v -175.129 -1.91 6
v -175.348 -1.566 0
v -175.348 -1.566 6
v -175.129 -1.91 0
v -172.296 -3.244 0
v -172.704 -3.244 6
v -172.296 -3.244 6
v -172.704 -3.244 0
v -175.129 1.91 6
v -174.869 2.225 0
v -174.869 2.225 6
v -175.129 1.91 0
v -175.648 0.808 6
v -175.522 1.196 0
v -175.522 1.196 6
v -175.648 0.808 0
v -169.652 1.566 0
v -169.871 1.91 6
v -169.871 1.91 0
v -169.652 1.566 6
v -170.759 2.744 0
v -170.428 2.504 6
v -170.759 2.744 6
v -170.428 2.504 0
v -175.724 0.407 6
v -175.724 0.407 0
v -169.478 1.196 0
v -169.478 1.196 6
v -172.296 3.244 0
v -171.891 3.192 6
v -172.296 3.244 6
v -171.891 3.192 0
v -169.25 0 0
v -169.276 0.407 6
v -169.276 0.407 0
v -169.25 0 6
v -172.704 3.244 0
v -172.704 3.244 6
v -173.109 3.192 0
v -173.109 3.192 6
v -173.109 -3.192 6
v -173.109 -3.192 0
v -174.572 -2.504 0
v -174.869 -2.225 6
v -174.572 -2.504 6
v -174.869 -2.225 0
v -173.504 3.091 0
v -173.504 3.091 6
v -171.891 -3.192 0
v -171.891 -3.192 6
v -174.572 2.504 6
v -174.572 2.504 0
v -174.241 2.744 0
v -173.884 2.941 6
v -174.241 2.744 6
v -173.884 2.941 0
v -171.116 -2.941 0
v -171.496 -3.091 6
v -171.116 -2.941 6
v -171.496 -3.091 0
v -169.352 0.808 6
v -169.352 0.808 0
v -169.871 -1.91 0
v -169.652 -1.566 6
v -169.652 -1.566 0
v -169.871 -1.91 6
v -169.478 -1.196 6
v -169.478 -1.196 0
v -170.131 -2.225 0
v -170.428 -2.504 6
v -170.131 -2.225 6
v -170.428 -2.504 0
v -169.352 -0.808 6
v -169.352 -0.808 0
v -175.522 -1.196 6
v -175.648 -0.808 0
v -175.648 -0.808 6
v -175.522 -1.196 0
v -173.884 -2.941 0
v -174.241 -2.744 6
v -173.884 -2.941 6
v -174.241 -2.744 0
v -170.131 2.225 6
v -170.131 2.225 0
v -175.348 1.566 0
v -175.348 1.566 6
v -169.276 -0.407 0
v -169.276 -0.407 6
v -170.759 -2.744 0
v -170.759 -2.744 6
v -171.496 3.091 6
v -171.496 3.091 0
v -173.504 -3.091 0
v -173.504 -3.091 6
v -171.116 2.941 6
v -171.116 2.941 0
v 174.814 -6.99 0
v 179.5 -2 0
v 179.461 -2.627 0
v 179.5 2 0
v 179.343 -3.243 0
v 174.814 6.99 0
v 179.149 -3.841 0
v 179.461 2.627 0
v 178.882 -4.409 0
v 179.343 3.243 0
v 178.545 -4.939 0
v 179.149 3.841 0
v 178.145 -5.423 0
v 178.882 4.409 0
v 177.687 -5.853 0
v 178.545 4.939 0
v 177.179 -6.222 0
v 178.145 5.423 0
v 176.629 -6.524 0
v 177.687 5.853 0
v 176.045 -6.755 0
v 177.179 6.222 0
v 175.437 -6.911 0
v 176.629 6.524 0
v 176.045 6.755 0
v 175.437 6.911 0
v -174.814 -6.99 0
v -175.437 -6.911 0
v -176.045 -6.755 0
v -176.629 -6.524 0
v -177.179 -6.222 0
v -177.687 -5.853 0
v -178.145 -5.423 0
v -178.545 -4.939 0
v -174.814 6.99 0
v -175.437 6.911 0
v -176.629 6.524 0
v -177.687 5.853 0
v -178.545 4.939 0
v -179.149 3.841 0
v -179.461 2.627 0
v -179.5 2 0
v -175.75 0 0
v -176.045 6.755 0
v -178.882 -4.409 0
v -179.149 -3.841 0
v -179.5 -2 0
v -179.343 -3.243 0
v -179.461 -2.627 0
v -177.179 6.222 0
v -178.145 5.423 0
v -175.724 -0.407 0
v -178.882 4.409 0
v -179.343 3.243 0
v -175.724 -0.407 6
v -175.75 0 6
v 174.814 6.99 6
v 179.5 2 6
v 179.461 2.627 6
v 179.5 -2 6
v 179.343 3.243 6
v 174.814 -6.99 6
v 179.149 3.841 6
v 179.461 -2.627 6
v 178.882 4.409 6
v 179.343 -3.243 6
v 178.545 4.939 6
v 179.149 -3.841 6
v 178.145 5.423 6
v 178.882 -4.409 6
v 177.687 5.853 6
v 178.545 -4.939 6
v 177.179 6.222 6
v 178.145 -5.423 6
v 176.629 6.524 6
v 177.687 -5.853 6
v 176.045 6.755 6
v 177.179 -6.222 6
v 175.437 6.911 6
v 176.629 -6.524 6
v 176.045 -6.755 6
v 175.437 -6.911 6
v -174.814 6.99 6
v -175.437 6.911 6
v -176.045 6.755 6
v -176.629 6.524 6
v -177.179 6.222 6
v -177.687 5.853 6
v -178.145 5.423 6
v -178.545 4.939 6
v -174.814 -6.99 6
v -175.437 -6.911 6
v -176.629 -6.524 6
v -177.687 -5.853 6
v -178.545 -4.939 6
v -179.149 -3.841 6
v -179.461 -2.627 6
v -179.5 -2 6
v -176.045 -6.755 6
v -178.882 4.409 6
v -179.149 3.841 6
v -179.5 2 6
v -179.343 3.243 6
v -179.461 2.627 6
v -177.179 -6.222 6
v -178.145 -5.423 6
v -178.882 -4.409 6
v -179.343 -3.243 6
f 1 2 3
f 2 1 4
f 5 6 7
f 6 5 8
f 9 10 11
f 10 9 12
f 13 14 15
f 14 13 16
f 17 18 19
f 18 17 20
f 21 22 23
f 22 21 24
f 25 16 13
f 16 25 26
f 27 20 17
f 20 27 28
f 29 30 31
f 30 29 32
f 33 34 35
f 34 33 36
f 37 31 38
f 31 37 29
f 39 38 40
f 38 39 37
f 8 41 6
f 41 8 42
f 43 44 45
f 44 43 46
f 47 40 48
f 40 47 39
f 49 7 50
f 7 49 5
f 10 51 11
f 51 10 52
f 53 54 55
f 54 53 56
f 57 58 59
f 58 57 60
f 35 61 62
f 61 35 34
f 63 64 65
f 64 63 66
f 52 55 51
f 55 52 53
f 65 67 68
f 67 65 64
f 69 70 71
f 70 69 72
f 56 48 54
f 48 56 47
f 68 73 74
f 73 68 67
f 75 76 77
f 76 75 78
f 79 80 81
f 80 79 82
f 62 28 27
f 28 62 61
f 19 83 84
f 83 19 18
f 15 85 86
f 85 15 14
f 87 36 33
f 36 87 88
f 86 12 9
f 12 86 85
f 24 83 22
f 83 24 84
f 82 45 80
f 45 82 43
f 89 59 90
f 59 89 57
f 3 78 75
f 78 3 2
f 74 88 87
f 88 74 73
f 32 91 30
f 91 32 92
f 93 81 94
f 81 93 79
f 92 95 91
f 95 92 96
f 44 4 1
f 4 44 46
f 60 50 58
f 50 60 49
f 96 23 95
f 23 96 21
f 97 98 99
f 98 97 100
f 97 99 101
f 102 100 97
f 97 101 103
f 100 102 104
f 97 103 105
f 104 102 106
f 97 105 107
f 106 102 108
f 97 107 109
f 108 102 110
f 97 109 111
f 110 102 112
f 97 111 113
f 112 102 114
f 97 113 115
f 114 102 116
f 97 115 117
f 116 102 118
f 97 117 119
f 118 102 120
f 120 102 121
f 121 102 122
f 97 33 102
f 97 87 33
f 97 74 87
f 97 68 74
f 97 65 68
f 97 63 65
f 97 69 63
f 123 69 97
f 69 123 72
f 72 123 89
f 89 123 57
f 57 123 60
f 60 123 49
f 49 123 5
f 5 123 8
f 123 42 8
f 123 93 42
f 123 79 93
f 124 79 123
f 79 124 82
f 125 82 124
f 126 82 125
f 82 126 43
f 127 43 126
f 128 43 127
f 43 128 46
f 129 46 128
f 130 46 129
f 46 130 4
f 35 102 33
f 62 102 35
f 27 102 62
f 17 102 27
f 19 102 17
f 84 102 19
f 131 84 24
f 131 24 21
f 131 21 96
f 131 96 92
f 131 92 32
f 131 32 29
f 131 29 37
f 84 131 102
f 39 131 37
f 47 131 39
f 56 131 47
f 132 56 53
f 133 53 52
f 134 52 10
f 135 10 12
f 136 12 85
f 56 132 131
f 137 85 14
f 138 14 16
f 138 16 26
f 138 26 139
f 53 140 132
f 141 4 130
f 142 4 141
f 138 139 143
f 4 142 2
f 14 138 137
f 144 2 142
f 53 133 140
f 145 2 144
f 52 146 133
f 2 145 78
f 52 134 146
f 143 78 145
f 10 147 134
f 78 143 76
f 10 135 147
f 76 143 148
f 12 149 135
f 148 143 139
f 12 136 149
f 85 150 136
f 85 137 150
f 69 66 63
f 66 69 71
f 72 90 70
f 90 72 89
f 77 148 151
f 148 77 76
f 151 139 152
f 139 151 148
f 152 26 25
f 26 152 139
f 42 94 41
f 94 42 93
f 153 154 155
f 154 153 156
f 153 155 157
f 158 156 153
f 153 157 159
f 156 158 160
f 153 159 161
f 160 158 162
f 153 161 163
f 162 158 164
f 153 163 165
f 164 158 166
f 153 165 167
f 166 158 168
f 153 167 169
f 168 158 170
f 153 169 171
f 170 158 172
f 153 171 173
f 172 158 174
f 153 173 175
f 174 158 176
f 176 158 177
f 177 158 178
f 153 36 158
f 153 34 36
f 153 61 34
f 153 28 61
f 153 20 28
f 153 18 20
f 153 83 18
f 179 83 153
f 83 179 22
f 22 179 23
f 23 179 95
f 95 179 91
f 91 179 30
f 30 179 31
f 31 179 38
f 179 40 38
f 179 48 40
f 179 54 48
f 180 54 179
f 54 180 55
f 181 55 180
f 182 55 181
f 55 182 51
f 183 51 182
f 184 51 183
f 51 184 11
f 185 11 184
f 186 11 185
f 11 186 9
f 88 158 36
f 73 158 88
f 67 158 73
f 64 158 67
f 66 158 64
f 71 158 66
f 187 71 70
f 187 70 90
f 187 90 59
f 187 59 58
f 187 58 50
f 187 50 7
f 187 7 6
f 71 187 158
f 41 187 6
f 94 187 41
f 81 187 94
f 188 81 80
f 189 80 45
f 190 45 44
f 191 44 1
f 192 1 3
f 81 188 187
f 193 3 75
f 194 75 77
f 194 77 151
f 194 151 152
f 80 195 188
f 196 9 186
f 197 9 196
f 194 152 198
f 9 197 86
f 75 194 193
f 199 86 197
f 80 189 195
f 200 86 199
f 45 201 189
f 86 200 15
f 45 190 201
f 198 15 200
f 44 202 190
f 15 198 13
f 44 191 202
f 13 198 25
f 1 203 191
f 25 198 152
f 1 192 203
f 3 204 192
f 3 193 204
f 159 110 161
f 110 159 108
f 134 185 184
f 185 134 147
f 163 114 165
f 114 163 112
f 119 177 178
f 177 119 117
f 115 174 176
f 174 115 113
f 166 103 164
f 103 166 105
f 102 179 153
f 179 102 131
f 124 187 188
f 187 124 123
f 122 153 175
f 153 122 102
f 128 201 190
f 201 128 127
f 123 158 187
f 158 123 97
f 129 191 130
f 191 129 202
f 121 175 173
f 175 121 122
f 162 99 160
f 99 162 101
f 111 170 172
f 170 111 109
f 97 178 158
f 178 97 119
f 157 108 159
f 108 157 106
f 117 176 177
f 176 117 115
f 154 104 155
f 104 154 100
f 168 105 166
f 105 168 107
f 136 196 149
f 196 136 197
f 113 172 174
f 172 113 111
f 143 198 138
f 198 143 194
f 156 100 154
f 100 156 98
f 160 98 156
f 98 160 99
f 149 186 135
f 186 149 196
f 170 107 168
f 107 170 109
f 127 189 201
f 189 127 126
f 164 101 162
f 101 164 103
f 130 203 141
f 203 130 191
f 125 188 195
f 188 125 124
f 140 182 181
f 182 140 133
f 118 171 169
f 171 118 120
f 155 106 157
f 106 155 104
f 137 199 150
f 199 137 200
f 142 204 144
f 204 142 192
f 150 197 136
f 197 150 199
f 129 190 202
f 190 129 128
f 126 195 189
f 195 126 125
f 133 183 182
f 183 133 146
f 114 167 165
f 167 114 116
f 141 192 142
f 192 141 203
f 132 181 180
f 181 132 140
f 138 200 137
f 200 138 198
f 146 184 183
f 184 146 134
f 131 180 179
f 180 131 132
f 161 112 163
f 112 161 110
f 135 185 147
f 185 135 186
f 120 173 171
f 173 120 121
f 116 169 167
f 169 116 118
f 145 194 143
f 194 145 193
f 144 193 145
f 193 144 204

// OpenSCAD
$fn = 50;


difference() {
	union() {
		hull() {
			translate(v = [-174.5000000000, 2.0000000000, 0]) {
				cylinder(h = 6, r = 5);
			}
			translate(v = [174.5000000000, 2.0000000000, 0]) {
				cylinder(h = 6, r = 5);
			}
			translate(v = [-174.5000000000, -2.0000000000, 0]) {
				cylinder(h = 6, r = 5);
			}
			translate(v = [174.5000000000, -2.0000000000, 0]) {
				cylinder(h = 6, r = 5);
			}
		}
	}
	union() {
		translate(v = [-172.5000000000, 0.0000000000, 0]) {
			cylinder(h = 6, r = 3.2500000000);
		}
		translate(v = [-172.5000000000, 0.0000000000, 0]) {
			cylinder(h = 6, r = 1.8000000000);
		}
		translate(v = [-172.5000000000, 0.0000000000, 0]) {
			cylinder(h = 6, r = 1.8000000000);
		}
		translate(v = [-172.5000000000, 0.0000000000, 0]) {
			cylinder(h = 6, r = 1.8000000000);
		}
	}
}
